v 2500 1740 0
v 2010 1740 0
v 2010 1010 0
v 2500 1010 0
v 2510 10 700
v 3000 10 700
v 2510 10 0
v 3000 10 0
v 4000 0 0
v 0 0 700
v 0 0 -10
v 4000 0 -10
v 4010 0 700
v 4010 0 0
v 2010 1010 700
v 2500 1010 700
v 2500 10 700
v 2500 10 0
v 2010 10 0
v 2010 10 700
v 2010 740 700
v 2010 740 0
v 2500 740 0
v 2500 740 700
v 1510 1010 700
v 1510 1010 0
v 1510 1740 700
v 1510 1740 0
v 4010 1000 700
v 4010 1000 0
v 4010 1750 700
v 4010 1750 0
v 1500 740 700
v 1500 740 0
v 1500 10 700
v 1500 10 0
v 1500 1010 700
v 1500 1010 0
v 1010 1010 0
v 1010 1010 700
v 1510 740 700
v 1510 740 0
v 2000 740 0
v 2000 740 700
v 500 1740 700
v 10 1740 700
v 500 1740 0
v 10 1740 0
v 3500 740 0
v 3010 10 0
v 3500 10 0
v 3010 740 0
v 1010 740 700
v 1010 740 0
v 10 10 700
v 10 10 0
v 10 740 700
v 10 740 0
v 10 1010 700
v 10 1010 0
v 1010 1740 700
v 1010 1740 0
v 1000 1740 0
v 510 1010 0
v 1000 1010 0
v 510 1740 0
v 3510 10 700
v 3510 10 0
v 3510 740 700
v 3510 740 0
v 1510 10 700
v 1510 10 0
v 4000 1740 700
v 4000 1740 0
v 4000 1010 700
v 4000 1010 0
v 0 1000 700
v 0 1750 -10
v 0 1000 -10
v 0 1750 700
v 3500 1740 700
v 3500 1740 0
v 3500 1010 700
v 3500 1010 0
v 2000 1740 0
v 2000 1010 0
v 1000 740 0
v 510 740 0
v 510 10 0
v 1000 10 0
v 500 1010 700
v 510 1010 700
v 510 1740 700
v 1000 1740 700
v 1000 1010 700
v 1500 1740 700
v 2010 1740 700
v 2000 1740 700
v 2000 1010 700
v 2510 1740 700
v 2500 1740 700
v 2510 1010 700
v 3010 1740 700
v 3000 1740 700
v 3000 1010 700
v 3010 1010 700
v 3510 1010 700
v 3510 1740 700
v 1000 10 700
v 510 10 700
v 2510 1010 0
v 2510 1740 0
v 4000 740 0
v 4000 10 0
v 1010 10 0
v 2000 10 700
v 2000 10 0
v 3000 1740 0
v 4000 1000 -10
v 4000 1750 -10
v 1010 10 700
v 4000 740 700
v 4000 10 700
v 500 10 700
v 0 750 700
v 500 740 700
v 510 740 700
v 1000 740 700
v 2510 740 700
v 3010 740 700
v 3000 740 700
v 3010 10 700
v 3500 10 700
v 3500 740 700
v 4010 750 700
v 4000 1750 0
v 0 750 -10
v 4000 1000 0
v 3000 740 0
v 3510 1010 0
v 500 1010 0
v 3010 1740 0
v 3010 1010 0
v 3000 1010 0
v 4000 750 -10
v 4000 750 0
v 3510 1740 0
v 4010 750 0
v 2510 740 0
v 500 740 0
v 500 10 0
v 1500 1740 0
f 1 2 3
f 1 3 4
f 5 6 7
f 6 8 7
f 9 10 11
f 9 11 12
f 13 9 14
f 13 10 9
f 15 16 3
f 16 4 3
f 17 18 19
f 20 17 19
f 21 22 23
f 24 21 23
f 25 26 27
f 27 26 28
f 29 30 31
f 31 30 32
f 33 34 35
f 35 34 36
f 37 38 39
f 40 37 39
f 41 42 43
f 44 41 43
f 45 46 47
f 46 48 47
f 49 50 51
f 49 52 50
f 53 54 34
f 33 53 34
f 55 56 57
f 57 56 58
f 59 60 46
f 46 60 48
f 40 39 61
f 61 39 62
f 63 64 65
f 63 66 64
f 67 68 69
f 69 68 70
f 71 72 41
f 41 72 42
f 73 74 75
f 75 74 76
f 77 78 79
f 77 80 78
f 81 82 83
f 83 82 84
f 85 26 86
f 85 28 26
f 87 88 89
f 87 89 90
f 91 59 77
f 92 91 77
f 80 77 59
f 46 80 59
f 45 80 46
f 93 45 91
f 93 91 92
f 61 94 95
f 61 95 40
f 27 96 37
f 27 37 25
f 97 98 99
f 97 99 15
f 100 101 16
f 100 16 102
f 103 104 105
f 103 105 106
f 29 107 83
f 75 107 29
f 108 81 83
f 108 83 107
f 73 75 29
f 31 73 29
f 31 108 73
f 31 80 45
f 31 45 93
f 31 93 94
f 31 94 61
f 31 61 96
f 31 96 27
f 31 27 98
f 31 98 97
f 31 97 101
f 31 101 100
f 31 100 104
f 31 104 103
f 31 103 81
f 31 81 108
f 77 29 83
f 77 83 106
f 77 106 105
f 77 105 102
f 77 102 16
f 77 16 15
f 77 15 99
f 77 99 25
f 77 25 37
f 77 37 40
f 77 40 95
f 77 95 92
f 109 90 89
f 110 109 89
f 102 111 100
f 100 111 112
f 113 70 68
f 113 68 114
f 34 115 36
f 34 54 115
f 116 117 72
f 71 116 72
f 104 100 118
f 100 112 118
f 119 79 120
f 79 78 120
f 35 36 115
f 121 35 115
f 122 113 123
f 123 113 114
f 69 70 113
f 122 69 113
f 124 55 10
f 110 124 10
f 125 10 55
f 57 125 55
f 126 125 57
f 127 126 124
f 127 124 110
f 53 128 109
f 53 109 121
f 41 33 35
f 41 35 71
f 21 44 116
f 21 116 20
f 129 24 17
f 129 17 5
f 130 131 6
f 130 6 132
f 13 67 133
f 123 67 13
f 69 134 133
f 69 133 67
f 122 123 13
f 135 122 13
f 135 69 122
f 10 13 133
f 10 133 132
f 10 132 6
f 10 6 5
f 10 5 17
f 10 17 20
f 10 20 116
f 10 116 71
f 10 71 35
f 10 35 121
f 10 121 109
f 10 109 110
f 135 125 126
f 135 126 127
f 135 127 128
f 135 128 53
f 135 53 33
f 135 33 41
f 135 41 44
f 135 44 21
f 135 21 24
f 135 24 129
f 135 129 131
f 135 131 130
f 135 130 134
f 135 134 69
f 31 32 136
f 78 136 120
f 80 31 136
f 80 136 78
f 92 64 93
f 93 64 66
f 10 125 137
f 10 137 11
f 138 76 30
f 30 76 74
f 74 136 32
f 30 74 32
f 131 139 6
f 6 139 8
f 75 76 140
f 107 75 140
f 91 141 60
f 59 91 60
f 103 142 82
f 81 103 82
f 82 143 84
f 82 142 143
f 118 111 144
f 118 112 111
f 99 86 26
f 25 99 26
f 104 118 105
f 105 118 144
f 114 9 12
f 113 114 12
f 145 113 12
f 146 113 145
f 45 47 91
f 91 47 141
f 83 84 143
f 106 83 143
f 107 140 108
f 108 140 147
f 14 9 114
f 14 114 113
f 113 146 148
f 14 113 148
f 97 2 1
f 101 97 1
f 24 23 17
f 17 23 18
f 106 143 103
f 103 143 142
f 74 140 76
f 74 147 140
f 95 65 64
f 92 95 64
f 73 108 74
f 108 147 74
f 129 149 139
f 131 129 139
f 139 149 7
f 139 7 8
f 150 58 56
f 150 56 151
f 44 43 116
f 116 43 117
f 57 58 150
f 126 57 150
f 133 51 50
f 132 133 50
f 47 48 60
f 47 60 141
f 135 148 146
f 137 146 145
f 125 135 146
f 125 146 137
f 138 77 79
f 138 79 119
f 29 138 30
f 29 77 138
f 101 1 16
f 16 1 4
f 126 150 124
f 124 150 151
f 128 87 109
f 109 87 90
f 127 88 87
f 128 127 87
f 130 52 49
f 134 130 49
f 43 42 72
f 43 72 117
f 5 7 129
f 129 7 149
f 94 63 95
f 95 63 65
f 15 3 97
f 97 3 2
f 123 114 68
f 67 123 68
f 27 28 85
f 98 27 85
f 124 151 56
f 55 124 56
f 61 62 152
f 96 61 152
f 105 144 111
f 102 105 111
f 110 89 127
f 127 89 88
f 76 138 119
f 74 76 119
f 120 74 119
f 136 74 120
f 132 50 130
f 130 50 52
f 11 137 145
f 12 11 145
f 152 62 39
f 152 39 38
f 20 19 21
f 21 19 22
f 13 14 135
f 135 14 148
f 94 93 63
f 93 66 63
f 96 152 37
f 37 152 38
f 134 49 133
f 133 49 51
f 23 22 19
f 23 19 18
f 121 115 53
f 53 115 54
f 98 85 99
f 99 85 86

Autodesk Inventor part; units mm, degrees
ref_plane "YZ Plane" through (0, 0, 0) normal (1, 0, 0) x (0, 1, 0)
ref_plane "XZ Plane" through (0, 0, 0) normal (0, 1, 0) x (-1, 0, 0)
ref_plane "XY Plane" through (0, 0, 0) normal (0, 0, 1) x (1, 0, 0)
sketch "Boceto1" plane through (0, 0, 0) normal (0, 0, 1) x (1, 0, 0)
  line L0 (0, 0) -> (4000, 0)
  line L1 (4000, 0) -> (4000, 750)
  line L2 (4000, 750) -> (0, 750)
  line L3 (0, 750) -> (0, 0)
extrude "Extrusión1" add sketch "Boceto1" against normal blind 10
sketch "Boceto2" plane through (0, 0, 0) normal (0, 0, 1) x (1, 0, 0)
  line L0 (0, 0) -> (10, 0)
  line L1 (10, 0) -> (10, 750)
  line L2 (10, 750) -> (0, 750)
  line L3 (0, 750) -> (0, 0)
  line L4 (500, 0) -> (510, 0)
  line L5 (510, 0) -> (510, 750)
  line L6 (510, 750) -> (500, 750)
  line L7 (500, 750) -> (500, 0)
  line L8 (1000, 0) -> (1010, 0)
  line L9 (1010, 0) -> (1010, 750)
  line L10 (1010, 750) -> (1000, 750)
  line L11 (1000, 750) -> (1000, 0)
  line L12 (1500, 0) -> (1510, 0)
  line L13 (1510, 0) -> (1510, 750)
  line L14 (1510, 750) -> (1500, 750)
  line L15 (1500, 750) -> (1500, 0)
  line L16 (2000, 0) -> (2010, 0)
  line L17 (2010, 0) -> (2010, 750)
  line L18 (2010, 750) -> (2000, 750)
  line L19 (2000, 750) -> (2000, 0)
  line L20 (2500, 0) -> (2510, 0)
  line L21 (2510, 0) -> (2510, 750)
  line L22 (2510, 750) -> (2500, 750)
  line L23 (2500, 750) -> (2500, 0)
  line L24 (3000, 0) -> (3010, 0)
  line L25 (3010, 0) -> (3010, 750)
  line L26 (3010, 750) -> (3000, 750)
  line L27 (3000, 750) -> (3000, 0)
  line L28 (3500, 0) -> (3510, 0)
  line L29 (3510, 0) -> (3510, 750)
  line L30 (3510, 750) -> (3500, 750)
  line L31 (3500, 750) -> (3500, 0)
  line L32 (4000, 0) -> (4010, 0)
  line L33 (4010, 0) -> (4010, 750)
  line L34 (4010, 750) -> (4000, 750)
  line L35 (4000, 750) -> (4000, 0)
extrude "Extrusión2" add sketch "Boceto2" along normal blind 700 contours L3 L2 L1 L0
extrude "Extrusión3" add sketch "Boceto2" along normal blind 700 contours L3 L2 L1 L0 | L7 L6 L5 L4
extrude "Extrusión4" add sketch "Boceto2" along normal blind 700 contours L3 L2 L1 L0 | L7 L6 L5 L4 | L11 L10 L9 L8
extrude "Extrusión5" add sketch "Boceto2" along normal blind 700 contours L3 L2 L1 L0 | L7 L6 L5 L4 | L11 L10 L9 L8 | L15 L14 L13 L12
extrude "Extrusión6" add sketch "Boceto2" along normal blind 700 contours L3 L2 L1 L0 | L7 L6 L5 L4 | L11 L10 L9 L8 | L15 L14 L13 L12 | L19 L18 L17 L16
extrude "Extrusión7" add sketch "Boceto2" along normal blind 700 contours L3 L2 L1 L0 | L7 L6 L5 L4 | L11 L10 L9 L8 | L15 L14 L13 L12 | L19 L18 L17 L16 | L23 L22 L21 L20
extrude "Extrusión8" add sketch "Boceto2" along normal blind 700 contours L3 L2 L1 L0 | L7 L6 L5 L4 | L11 L10 L9 L8 | L15 L14 L13 L12 | L19 L18 L17 L16 | L23 L22 L21 L20 | L27 L26 L25 L24
extrude "Extrusión9" add sketch "Boceto2" along normal blind 700 contours L3 L2 L1 L0 | L7 L6 L5 L4 | L11 L10 L9 L8 | L15 L14 L13 L12 | L19 L18 L17 L16 | L23 L22 L21 L20 | L27 L26 L25 L24 | L31 L30 L29 L28
extrude "Extrusión10" add sketch "Boceto2" along normal blind 700
sketch "Boceto3" plane through (0, 0, 0) normal (0, 0, 1) x (1, 0, 0)
  line L0 (0, 0) -> (4000, 0)
  line L1 (4000, 0) -> (4000, 10)
  line L2 (4000, 10) -> (0, 10)
  line L3 (0, 10) -> (0, 0)
  line L4 (0, 740) -> (4000, 740)
  line L5 (4000, 740) -> (4000, 750)
  line L6 (4000, 750) -> (0, 750)
  line L7 (0, 750) -> (0, 740)
extrude "Extrusión11" add sketch "Boceto3" along normal blind 700 contours L3 L2 L1 L0
extrude "Extrusión12" add sketch "Boceto3" along normal blind 700
sketch "Boceto4" plane through (0, 0, 0) normal (0, 0, 1) x (1, 0, 0)
  line L0 (0, 1000) -> (4000, 1000)
  line L1 (4000, 1000) -> (4000, 1750)
  line L2 (4000, 1750) -> (0, 1750)
  line L3 (0, 1750) -> (0, 1000)
extrude "Extrusión13" add sketch "Boceto4" against normal blind 10
sketch "Boceto5" plane through (0, 0, 0) normal (0, 0, 1) x (1, 0, 0)
  line L0 (0, 1000) -> (10, 1000)
  line L1 (10, 1000) -> (10, 1750)
  line L2 (10, 1750) -> (0, 1750)
  line L3 (0, 1750) -> (0, 1000)
  line L4 (500, 1000) -> (510, 1000)
  line L5 (510, 1000) -> (510, 1750)
  line L6 (510, 1750) -> (500, 1750)
  line L7 (500, 1750) -> (500, 1000)
  line L8 (1000, 1000) -> (1010, 1000)
  line L9 (1010, 1000) -> (1010, 1750)
  line L10 (1010, 1750) -> (1000, 1750)
  line L11 (1000, 1750) -> (1000, 1000)
  line L12 (1500, 1000) -> (1510, 1000)
  line L13 (1510, 1000) -> (1510, 1750)
  line L14 (1510, 1750) -> (1500, 1750)
  line L15 (1500, 1750) -> (1500, 1000)
  line L16 (2000, 1000) -> (2010, 1000)
  line L17 (2010, 1000) -> (2010, 1750)
  line L18 (2010, 1750) -> (2000, 1750)
  line L19 (2000, 1750) -> (2000, 1000)
  line L20 (2500, 1000) -> (2510, 1000)
  line L21 (2510, 1000) -> (2510, 1750)
  line L22 (2510, 1750) -> (2500, 1750)
  line L23 (2500, 1750) -> (2500, 1000)
  line L24 (3000, 1000) -> (3010, 1000)
  line L25 (3010, 1000) -> (3010, 1750)
  line L26 (3010, 1750) -> (3000, 1750)
  line L27 (3000, 1750) -> (3000, 1000)
  line L28 (3500, 1000) -> (3510, 1000)
  line L29 (3510, 1000) -> (3510, 1750)
  line L30 (3510, 1750) -> (3500, 1750)
  line L31 (3500, 1750) -> (3500, 1000)
  line L32 (4000, 1000) -> (4010, 1000)
  line L33 (4010, 1000) -> (4010, 1750)
  line L34 (4010, 1750) -> (4000, 1750)
  line L35 (4000, 1750) -> (4000, 1000)
  line L36 (0, 1000) -> (4000, 1000)
  line L37 (4000, 1000) -> (4000, 1010)
  line L38 (4000, 1010) -> (0, 1010)
  line L39 (0, 1010) -> (0, 1000)
  line L40 (0, 1740) -> (4000, 1740)
  line L41 (4000, 1740) -> (4000, 1750)
  line L42 (4000, 1750) -> (0, 1750)
  line L43 (0, 1750) -> (0, 1740)
extrude "Extrusión14" add sketch "Boceto5" along normal blind 700 contours L3 L38 L1 L0 | L3 L40 L1 L38 | L3 L2 L1 L40
extrude "Extrusión15" add sketch "Boceto5" along normal blind 700 contours L3 L38 L1 L0 | L3 L40 L1 L38 | L7 L38 L5 L4 | L3 L2 L1 L40 | L7 L40 L5 L38 | L7 L6 L5 L40
extrude "Extrusión16" add sketch "Boceto5" along normal blind 700 contours L3 L38 L1 L0 | L3 L40 L1 L38 | L7 L38 L5 L4 | L3 L2 L1 L40 | L7 L40 L5 L38 | L7 L6 L5 L40 | L11 L38 L9 L8 | L11 L40 L9 L38 | L11 L10 L9 L40
extrude "Extrusión17" add sketch "Boceto5" along normal blind 700 contours L3 L38 L1 L0 | L3 L40 L1 L38 | L7 L38 L5 L4 | L3 L2 L1 L40 | L7 L40 L5 L38 | L7 L6 L5 L40 | L11 L38 L9 L8 | L11 L40 L9 L38 | L11 L10 L9 L40 | L15 L38 L13 L12 | L15 L40 L13 L38 | L15 L14 L13 L40
extrude "Extrusión18" add sketch "Boceto5" along normal blind 700 contours L3 L38 L1 L0 | L3 L40 L1 L38 | L7 L38 L5 L4 | L3 L2 L1 L40 | L7 L40 L5 L38 | L7 L6 L5 L40 | L11 L38 L9 L8 | L11 L40 L9 L38 | L11 L10 L9 L40 | L15 L38 L13 L12 | L15 L40 L13 L38 | L15 L14 L13 L40 | L19 L38 L17 L16 | L19 L40 L17 L38 | L19 L18 L17 L40
extrude "Extrusión19" add sketch "Boceto5" along normal blind 700 contours L3 L38 L1 L0 | L3 L40 L1 L38 | L7 L38 L5 L4 | L3 L2 L1 L40 | L7 L40 L5 L38 | L7 L6 L5 L40 | L11 L38 L9 L8 | L11 L40 L9 L38 | L11 L10 L9 L40 | L15 L38 L13 L12 | L15 L40 L13 L38 | L15 L14 L13 L40 | L19 L38 L17 L16 | L19 L40 L17 L38 | L19 L18 L17 L40 | L23 L38 L21 L20 | L23 L40 L21 L38 | L23 L22 L21 L40
extrude "Extrusión20" add sketch "Boceto5" along normal blind 700 contours L3 L38 L1 L0 | L3 L40 L1 L38 | L7 L38 L5 L4 | L3 L2 L1 L40 | L7 L40 L5 L38 | L7 L6 L5 L40 | L11 L38 L9 L8 | L11 L40 L9 L38 | L11 L10 L9 L40 | L15 L38 L13 L12 | L15 L40 L13 L38 | L15 L14 L13 L40 | L19 L38 L17 L16 | L19 L40 L17 L38 | L19 L18 L17 L40 | L23 L38 L21 L20 | L23 L40 L21 L38 | L23 L22 L21 L40 | L27 L38 L25 L24 | L27 L40 L25 L38 | L27 L26 L25 L40
extrude "Extrusión21" add sketch "Boceto5" along normal blind 700 contours L3 L38 L1 L0 | L3 L40 L1 L38 | L7 L38 L5 L4 | L3 L2 L1 L40 | L7 L40 L5 L38 | L7 L6 L5 L40 | L11 L38 L9 L8 | L11 L40 L9 L38 | L11 L10 L9 L40 | L15 L38 L13 L12 | L15 L40 L13 L38 | L15 L14 L13 L40 | L19 L38 L17 L16 | L19 L40 L17 L38 | L19 L18 L17 L40 | L23 L38 L21 L20 | L23 L40 L21 L38 | L23 L22 L21 L40 | L27 L38 L25 L24 | L27 L40 L25 L38 | L27 L26 L25 L40 | L31 L38 L29 L28 | L31 L40 L29 L38 | L31 L30 L29 L40
extrude "Extrusión22" add sketch "Boceto5" along normal blind 700 contours L3 L38 L1 L0 | L3 L40 L1 L38 | L7 L38 L5 L4 | L3 L2 L1 L40 | L7 L40 L5 L38 | L7 L6 L5 L40 | L11 L38 L9 L8 | L11 L40 L9 L38 | L11 L10 L9 L40 | L15 L38 L13 L12 | L15 L40 L13 L38 | L15 L14 L13 L40 | L19 L38 L17 L16 | L19 L40 L17 L38 | L19 L18 L17 L40 | L23 L38 L21 L20 | L23 L40 L21 L38 | L23 L22 L21 L40 | L27 L38 L25 L24 | L27 L40 L25 L38 | L27 L26 L25 L40 | L31 L38 L29 L28 | L31 L40 L29 L38 | L31 L30 L29 L40 | L35 L34 L33 L32
extrude "Extrusión23" add sketch "Boceto5" along normal blind 700 contours L3 L38 L1 L0 | L1 L38 L7 L36 | L3 L40 L1 L38 | L7 L38 L5 L4 | L3 L2 L1 L40 | L7 L40 L5 L38 | L5 L38 L11 L36 | L7 L6 L5 L40 | L11 L38 L9 L8 | L11 L40 L9 L38 | L9 L38 L15 L36 | L11 L10 L9 L40 | L15 L38 L13 L12 | L15 L40 L13 L38 | L13 L38 L19 L36 | L15 L14 L13 L40 | L19 L38 L17 L16 | L19 L40 L17 L38 | L17 L38 L23 L36 | L19 L18 L17 L40 | L23 L38 L21 L20 | L23 L40 L21 L38 | L21 L38 L27 L36 | L23 L22 L21 L40 | L27 L38 L25 L24 | L27 L40 L25 L38 | L25 L38 L31 L36 | L27 L26 L25 L40 | L31 L38 L29 L28 | L31 L40 L29 L38 | L29 L38 L35 L36 | L31 L30 L29 L40 | L35 L34 L33 L32
extrude "Extrusión24" add sketch "Boceto5" along normal blind 700 contours L3 L38 L1 L0 | L1 L38 L7 L36 | L3 L40 L1 L38 | L7 L38 L5 L4 | L3 L2 L1 L40 | L1 L42 L7 L40 | L7 L40 L5 L38 | L5 L38 L11 L36 | L7 L6 L5 L40 | L11 L38 L9 L8 | L5 L42 L11 L40 | L11 L40 L9 L38 | L9 L38 L15 L36 | L11 L10 L9 L40 | L15 L38 L13 L12 | L9 L42 L15 L40 | L15 L40 L13 L38 | L13 L38 L19 L36 | L15 L14 L13 L40 | L19 L38 L17 L16 | L13 L42 L19 L40 | L19 L40 L17 L38 | L17 L38 L23 L36 | L19 L18 L17 L40 | L23 L38 L21 L20 | L17 L42 L23 L40 | L23 L40 L21 L38 | L21 L38 L27 L36 | L23 L22 L21 L40 | L27 L38 L25 L24 | L21 L42 L27 L40 | L27 L40 L25 L38 | L25 L38 L31 L36 | L27 L26 L25 L40 | L31 L38 L29 L28 | L25 L42 L31 L40 | L31 L40 L29 L38 | L29 L38 L35 L36 | L31 L30 L29 L40 | L35 L34 L33 L32 | L29 L42 L35 L40
properties part number "mesa" material "Acero"
